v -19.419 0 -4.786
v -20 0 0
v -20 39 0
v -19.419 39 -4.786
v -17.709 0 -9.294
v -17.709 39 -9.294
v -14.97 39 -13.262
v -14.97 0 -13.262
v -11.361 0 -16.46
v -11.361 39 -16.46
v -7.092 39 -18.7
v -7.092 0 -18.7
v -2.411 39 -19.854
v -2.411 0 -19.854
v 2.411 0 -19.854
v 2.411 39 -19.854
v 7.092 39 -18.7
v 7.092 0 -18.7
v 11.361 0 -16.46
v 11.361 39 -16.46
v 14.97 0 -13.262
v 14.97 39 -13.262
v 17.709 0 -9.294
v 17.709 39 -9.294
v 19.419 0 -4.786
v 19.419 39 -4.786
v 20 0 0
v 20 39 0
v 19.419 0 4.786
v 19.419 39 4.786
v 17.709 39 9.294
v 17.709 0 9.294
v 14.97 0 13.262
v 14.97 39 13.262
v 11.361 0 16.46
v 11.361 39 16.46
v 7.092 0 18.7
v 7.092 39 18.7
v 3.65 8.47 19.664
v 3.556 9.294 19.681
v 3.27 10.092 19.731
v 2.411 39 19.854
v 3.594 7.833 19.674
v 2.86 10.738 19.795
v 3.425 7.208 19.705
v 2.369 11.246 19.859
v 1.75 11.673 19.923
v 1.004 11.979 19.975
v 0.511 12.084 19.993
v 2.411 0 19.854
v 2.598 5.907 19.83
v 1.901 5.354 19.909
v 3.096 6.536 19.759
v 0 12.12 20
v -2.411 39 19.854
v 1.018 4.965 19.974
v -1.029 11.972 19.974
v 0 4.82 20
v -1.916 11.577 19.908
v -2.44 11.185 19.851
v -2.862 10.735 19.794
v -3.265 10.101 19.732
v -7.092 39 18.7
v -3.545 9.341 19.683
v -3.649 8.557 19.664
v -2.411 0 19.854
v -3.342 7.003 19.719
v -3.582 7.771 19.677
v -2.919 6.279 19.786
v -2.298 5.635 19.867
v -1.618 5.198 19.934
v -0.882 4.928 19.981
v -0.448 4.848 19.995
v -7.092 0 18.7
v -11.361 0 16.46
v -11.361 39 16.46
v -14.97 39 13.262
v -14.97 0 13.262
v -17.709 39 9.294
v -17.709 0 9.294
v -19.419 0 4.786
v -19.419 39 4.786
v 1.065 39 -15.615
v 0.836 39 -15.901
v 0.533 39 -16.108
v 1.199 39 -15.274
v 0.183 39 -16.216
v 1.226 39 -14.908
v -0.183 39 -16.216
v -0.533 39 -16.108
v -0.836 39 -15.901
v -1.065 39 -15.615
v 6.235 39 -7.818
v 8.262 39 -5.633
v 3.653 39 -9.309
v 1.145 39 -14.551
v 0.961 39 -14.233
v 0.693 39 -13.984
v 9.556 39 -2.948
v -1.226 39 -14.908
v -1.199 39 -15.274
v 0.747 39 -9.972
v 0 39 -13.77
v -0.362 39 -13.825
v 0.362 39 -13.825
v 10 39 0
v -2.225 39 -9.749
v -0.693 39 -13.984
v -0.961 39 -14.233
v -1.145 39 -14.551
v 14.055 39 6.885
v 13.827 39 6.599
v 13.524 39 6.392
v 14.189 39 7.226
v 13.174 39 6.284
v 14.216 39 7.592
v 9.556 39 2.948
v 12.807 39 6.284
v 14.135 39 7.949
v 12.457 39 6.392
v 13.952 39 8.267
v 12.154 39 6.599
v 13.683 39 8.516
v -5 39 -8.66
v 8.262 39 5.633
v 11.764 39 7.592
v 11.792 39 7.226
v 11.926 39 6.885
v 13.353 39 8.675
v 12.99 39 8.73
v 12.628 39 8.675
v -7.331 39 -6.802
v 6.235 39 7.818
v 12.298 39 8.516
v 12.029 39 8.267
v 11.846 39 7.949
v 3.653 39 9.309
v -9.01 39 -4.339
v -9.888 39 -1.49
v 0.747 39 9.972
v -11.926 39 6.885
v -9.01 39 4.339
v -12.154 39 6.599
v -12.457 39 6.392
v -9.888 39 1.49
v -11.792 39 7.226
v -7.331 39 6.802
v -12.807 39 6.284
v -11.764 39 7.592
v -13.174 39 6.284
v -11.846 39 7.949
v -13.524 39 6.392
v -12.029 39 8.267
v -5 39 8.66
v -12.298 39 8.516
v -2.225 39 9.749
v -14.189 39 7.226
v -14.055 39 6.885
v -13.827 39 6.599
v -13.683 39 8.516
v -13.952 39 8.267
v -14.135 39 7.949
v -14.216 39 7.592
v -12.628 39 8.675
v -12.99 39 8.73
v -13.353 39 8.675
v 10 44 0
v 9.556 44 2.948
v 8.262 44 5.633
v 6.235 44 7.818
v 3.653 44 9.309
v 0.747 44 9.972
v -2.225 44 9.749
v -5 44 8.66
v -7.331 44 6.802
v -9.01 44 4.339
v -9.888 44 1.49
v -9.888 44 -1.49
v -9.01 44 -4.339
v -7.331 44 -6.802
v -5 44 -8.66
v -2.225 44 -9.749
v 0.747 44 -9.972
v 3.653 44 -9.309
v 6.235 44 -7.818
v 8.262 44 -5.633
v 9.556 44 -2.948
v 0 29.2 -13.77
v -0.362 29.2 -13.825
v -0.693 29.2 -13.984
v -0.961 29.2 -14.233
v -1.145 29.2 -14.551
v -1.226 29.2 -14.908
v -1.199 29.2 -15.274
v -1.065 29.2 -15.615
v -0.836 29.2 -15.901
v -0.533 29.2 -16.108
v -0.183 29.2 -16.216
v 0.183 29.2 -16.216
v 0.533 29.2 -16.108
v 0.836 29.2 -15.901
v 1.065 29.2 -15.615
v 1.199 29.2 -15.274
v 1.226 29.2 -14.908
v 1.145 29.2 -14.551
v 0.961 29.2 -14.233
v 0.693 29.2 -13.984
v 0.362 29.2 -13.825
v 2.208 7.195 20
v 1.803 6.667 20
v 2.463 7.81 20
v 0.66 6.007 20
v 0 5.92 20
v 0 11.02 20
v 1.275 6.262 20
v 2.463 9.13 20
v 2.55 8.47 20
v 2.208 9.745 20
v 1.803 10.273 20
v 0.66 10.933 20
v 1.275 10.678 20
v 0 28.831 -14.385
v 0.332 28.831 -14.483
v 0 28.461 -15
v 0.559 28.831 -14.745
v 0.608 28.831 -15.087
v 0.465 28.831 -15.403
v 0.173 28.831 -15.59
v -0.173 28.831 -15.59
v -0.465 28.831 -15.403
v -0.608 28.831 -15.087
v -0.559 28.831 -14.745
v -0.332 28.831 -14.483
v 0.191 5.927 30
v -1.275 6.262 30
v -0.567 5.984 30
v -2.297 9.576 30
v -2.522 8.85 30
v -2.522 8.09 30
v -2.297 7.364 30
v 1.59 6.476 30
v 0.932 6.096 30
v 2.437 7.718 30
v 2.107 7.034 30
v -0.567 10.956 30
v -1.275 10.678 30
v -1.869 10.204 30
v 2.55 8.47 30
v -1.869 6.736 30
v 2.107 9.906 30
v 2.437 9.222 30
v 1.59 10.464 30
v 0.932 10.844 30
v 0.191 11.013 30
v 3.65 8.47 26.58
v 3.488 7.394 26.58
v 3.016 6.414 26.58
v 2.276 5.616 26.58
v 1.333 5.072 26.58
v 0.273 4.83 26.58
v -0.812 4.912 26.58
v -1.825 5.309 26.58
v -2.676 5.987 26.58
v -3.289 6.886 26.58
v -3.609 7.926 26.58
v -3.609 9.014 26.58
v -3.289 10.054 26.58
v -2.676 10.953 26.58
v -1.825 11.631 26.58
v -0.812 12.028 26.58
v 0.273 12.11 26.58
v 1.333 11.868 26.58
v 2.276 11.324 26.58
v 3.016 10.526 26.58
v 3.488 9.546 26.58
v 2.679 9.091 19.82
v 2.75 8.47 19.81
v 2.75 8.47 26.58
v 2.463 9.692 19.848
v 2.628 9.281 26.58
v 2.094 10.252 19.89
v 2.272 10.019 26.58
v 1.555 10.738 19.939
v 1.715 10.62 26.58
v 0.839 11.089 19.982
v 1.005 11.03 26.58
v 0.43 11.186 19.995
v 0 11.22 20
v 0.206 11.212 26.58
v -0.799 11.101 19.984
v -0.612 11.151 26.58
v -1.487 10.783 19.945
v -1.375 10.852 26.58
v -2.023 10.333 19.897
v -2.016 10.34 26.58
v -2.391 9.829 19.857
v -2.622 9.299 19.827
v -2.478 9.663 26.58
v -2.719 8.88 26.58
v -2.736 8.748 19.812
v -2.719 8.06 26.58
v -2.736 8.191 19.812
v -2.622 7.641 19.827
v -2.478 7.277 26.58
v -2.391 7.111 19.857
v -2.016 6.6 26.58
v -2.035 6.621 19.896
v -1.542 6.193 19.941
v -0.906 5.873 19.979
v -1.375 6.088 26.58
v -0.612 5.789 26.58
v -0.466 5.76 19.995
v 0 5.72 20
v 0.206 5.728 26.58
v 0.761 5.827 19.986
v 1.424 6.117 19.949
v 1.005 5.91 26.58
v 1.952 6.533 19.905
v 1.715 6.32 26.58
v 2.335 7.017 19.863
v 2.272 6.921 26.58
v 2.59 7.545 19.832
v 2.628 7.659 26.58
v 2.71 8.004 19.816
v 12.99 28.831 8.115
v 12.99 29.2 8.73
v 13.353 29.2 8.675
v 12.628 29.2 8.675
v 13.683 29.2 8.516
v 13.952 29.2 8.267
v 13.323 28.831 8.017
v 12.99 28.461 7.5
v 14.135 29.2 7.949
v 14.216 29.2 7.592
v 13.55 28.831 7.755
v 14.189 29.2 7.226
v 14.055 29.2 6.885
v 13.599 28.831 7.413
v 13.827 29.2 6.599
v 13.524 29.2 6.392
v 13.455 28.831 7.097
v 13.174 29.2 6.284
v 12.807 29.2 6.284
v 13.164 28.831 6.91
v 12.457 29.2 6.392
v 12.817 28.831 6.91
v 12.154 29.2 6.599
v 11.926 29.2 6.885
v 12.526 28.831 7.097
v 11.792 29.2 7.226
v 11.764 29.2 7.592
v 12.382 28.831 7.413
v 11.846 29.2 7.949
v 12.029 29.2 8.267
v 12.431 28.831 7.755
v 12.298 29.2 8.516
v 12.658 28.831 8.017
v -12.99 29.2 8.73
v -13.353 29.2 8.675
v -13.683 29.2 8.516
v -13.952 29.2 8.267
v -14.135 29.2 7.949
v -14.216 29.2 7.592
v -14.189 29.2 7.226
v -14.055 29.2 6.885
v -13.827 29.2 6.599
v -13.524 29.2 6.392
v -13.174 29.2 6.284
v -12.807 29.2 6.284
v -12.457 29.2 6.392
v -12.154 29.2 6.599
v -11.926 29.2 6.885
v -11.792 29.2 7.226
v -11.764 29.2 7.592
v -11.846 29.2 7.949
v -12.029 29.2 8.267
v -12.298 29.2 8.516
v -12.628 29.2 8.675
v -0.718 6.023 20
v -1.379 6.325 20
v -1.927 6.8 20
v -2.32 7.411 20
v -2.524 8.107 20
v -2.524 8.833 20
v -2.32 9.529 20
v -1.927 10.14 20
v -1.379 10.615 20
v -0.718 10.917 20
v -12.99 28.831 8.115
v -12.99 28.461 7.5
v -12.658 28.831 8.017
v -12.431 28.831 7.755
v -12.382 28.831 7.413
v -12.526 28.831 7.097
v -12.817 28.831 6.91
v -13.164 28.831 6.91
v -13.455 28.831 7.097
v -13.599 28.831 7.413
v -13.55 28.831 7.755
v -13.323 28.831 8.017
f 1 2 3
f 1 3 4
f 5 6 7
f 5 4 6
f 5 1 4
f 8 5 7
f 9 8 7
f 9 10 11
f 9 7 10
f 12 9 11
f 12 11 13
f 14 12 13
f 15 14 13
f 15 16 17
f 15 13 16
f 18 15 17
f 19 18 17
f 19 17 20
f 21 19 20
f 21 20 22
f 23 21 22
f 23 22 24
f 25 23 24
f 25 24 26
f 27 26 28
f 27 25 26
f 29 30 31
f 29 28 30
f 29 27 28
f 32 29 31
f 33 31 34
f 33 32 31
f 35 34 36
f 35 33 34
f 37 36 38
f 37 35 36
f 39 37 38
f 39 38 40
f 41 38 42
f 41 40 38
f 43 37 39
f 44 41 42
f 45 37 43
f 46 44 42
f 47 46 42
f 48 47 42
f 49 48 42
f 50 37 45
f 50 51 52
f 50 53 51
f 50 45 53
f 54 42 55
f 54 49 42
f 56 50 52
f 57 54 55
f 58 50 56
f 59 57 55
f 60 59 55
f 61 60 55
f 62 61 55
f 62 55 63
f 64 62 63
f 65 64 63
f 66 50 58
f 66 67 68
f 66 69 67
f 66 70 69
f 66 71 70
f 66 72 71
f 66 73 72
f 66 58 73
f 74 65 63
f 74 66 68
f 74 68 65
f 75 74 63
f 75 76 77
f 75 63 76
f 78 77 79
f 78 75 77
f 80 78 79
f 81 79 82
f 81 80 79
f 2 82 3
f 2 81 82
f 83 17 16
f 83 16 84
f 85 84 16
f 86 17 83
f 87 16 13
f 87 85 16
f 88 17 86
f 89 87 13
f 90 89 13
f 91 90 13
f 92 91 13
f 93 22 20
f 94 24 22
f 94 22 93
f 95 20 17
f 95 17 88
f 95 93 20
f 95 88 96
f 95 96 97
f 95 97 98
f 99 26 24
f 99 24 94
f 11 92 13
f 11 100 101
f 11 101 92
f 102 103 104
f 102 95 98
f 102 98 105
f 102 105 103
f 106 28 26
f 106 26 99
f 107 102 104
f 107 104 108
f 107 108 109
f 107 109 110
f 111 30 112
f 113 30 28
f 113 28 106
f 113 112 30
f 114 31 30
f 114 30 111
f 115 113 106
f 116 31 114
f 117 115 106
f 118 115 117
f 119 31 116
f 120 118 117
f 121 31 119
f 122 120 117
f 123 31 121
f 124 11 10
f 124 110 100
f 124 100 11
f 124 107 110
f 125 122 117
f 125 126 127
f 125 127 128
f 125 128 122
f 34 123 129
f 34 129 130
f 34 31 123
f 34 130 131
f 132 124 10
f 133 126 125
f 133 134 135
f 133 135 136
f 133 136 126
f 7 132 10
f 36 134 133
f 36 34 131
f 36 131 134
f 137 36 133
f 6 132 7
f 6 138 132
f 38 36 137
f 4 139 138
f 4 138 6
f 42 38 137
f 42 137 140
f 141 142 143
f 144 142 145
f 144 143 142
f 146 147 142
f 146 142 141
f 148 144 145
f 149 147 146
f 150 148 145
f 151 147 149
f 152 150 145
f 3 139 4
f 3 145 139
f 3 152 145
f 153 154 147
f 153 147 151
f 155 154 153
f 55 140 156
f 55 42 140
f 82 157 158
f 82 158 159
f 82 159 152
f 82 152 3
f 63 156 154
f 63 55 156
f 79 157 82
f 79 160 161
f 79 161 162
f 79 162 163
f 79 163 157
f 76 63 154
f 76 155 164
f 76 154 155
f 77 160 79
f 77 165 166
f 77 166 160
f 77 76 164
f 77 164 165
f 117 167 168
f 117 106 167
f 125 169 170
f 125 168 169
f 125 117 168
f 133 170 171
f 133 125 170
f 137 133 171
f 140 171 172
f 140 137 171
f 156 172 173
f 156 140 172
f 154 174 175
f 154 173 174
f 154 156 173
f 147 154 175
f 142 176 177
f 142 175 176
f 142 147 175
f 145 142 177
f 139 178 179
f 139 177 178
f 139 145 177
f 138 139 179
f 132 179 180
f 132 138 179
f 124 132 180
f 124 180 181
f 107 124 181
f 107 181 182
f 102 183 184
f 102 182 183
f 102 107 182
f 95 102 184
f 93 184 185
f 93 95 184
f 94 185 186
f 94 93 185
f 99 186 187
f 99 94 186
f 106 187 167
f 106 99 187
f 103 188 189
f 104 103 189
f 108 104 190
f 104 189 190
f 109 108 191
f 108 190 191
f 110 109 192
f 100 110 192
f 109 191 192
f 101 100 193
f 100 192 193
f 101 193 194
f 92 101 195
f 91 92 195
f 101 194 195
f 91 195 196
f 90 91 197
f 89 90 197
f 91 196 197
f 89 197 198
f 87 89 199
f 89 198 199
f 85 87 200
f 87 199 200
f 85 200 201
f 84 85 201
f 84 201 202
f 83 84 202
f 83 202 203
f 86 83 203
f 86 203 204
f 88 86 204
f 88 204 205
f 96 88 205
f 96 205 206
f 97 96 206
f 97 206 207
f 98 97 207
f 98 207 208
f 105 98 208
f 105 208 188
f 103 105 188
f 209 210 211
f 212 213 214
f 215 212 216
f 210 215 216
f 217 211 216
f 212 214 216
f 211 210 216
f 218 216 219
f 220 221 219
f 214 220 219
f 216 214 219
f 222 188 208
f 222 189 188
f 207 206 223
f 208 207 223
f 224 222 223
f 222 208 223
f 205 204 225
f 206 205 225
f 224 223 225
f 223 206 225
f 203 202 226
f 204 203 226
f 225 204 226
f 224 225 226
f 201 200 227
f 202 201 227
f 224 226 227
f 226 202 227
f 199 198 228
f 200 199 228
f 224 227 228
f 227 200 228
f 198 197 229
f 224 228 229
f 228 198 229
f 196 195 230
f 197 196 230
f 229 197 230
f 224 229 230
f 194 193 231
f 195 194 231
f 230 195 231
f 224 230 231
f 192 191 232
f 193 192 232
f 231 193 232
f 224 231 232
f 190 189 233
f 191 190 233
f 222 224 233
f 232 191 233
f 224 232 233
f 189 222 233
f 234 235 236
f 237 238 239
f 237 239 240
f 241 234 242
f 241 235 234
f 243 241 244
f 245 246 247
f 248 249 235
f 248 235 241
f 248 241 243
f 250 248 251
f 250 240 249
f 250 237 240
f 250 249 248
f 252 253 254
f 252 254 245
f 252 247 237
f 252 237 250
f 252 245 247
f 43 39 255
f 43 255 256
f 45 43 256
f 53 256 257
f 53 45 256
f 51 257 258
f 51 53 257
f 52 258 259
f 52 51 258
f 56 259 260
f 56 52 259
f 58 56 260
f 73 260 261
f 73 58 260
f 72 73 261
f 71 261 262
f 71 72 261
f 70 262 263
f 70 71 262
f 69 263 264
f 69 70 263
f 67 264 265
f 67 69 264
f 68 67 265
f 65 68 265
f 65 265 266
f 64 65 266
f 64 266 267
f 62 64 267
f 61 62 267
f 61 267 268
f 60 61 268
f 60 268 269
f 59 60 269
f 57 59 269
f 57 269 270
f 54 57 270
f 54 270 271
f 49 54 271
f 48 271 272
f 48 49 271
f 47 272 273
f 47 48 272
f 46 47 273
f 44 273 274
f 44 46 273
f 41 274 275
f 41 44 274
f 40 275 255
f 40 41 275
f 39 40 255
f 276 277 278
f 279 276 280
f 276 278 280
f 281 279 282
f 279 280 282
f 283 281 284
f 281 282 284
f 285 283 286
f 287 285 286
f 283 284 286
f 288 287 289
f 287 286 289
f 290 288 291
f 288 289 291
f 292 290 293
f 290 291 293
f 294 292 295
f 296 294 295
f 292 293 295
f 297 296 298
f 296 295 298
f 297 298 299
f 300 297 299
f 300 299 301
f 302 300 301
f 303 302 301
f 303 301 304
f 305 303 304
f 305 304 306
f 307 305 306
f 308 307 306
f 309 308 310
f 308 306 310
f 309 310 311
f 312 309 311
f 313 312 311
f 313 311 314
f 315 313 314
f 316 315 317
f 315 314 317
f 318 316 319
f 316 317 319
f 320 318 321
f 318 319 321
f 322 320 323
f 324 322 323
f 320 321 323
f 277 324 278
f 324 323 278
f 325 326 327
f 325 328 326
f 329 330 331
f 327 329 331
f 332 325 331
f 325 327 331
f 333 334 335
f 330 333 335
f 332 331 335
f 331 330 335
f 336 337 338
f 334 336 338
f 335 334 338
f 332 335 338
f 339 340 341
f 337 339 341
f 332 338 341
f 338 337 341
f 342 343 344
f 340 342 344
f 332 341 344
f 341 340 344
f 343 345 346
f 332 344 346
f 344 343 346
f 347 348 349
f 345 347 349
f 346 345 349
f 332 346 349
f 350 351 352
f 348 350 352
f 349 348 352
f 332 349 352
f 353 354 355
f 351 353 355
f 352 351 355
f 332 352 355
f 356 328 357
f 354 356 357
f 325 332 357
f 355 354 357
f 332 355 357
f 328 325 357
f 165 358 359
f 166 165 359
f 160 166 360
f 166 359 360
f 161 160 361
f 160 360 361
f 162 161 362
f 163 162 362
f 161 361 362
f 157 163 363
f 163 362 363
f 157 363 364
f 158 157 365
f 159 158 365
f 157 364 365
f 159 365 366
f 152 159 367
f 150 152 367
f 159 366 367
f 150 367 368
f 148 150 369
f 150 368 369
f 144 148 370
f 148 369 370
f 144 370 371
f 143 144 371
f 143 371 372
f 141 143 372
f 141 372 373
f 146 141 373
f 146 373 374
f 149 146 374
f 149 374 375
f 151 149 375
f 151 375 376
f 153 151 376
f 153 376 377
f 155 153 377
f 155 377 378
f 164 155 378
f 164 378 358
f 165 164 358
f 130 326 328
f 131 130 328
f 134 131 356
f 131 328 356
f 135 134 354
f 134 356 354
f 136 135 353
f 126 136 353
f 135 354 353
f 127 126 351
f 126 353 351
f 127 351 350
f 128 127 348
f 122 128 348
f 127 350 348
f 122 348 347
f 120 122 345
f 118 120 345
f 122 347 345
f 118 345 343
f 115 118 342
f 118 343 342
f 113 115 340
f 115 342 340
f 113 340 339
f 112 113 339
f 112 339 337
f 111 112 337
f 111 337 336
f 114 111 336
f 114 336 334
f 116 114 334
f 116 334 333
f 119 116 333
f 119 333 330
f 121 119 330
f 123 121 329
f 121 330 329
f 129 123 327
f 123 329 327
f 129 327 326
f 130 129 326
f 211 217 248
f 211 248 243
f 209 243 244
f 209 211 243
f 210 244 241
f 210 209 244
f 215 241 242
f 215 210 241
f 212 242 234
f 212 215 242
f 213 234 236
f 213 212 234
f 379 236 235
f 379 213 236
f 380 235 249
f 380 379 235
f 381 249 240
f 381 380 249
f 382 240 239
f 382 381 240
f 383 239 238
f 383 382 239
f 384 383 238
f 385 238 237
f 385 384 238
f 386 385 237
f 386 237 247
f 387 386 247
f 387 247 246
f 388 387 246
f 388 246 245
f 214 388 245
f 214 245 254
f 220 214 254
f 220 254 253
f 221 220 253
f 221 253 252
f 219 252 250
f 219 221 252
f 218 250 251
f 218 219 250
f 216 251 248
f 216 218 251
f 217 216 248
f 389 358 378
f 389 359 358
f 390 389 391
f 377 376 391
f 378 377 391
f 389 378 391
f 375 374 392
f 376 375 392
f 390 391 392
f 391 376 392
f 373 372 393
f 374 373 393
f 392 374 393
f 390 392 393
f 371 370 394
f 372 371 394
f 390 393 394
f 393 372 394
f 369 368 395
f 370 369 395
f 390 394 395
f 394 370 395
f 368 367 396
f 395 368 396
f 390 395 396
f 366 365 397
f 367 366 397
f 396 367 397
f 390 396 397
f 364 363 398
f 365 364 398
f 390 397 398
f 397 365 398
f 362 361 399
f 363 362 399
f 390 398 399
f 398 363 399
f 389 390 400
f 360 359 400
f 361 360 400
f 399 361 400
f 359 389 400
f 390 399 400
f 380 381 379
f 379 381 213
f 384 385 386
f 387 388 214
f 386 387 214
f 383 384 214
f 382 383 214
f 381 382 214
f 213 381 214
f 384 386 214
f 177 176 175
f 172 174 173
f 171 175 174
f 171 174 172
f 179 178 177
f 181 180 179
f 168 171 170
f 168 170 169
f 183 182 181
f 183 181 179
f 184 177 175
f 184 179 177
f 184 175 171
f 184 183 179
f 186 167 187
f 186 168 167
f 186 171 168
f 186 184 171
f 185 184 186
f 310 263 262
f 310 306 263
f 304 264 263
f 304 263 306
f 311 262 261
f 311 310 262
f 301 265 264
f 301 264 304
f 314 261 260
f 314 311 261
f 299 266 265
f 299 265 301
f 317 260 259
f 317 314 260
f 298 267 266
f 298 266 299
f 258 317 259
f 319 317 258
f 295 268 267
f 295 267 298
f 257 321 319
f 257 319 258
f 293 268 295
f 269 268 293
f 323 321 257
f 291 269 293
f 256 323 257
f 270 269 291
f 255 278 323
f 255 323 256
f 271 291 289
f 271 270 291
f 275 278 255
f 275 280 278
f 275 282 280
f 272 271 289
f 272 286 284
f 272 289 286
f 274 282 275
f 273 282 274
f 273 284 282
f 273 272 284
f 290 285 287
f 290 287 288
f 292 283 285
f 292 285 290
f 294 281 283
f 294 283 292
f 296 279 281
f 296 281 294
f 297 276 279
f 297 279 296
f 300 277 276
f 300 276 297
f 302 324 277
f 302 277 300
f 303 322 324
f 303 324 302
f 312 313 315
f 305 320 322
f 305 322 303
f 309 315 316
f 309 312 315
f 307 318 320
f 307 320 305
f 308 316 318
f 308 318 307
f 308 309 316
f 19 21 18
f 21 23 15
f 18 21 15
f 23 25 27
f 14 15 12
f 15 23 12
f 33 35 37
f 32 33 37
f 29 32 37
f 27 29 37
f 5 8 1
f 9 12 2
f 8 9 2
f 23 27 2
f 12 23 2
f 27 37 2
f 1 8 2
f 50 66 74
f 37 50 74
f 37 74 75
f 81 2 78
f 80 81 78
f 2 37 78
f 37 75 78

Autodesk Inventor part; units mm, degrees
ref_plane "YZ Plane" through (0, 0, 0) normal (1, 0, 0) x (0, 1, 0)
ref_plane "XZ Plane" through (0, 0, 0) normal (0, 1, 0) x (-1, 0, 0)
sketch "Sketch1" plane through (0, 0, 0) normal (0, 1, 0) x (-1, 0, 0)
  circle A0 centre (0, 0) radius 20
  dimension "d0" = 40
extrude "Extrusion1" add sketch "Sketch1" along normal blind 39
sketch "Sketch2" plane through (0, 39, 0) normal (0, 1, 0) x (1, 0, 0)
  circle A0 centre (0, 0) radius 10
  dimension "d3" = 20
extrude "Extrusion2" add sketch "Sketch2" along normal blind 5
sketch "Sketch3" plane through (0, 39, 0) normal (0, 1, 0) x (1, 0, 0)
  circle A0 centre (0, 0) radius 15 construction
  circle A1 centre (0, 0) radius 20 construction
  point P0 (0, 15)
  point P1 (-12.9904, -7.5)
  point P2 (12.9904, -7.5)
  dimension "d6" = 30
  dimension "d9" = 360
hole "Hole1" at (0, 39, -15) at (-12.9904, 39, 7.5) at (12.9904, 39, 7.5) direction (0, -1, 0) diameter 2.459 depth 9.8 tip angle 118 thread size "M3x0.5" class "6H" standard "ANSI Metric M Profile"
ref_plane "Work Plane2" through (0, 0, 20) normal (0, 0, 1) x (1, 0, 0)
sketch "Sketch6" plane through (0, 0, 20) normal (0, 0, 1) x (1, 0, 0)
  line L0 (20, 39) -> (-20, 39) projected
  line L1 (-20, 0) -> (20, 0) projected
  line L2 (-20, 0) -> (-20, 39) projected
  line L3 (20, 0) -> (20, 39) projected
  circle A0 centre (0, 8.47) radius 3.65
  circle A1 centre (0, 8.47) radius 2.75
  point P0 (0, 0)
  dimension "d25" = 7.3
  dimension "d26" = 8.47
  dimension "d29" = 0.9
extrude "Extrusion6" add sketch "Sketch6" along normal blind 6.58 and the other way blind 3.29 contours A0
sketch "Sketch7" plane through (0, 0, 20) normal (0, 0, 1) x (1, 0, 0)
  line L0 (20, 39) -> (-20, 39) projected
  line L1 (-20, 0) -> (-20, 39) projected
  line L2 (-20, 0) -> (20, 0) projected
  line L3 (20, 0) -> (20, 39) projected
  arc A0 (0, 4.82) -> (0, 12.12) centre (0, 8.47) ccw projected
  circle A1 centre (0, 8.47) radius 2.55
  point P0 (0, 0)
  dimension "d32" = 5.1
extrude "Extrusion7" add sketch "Sketch7" along normal blind 10 contours A1
properties part number "Belt Encoder Body"
